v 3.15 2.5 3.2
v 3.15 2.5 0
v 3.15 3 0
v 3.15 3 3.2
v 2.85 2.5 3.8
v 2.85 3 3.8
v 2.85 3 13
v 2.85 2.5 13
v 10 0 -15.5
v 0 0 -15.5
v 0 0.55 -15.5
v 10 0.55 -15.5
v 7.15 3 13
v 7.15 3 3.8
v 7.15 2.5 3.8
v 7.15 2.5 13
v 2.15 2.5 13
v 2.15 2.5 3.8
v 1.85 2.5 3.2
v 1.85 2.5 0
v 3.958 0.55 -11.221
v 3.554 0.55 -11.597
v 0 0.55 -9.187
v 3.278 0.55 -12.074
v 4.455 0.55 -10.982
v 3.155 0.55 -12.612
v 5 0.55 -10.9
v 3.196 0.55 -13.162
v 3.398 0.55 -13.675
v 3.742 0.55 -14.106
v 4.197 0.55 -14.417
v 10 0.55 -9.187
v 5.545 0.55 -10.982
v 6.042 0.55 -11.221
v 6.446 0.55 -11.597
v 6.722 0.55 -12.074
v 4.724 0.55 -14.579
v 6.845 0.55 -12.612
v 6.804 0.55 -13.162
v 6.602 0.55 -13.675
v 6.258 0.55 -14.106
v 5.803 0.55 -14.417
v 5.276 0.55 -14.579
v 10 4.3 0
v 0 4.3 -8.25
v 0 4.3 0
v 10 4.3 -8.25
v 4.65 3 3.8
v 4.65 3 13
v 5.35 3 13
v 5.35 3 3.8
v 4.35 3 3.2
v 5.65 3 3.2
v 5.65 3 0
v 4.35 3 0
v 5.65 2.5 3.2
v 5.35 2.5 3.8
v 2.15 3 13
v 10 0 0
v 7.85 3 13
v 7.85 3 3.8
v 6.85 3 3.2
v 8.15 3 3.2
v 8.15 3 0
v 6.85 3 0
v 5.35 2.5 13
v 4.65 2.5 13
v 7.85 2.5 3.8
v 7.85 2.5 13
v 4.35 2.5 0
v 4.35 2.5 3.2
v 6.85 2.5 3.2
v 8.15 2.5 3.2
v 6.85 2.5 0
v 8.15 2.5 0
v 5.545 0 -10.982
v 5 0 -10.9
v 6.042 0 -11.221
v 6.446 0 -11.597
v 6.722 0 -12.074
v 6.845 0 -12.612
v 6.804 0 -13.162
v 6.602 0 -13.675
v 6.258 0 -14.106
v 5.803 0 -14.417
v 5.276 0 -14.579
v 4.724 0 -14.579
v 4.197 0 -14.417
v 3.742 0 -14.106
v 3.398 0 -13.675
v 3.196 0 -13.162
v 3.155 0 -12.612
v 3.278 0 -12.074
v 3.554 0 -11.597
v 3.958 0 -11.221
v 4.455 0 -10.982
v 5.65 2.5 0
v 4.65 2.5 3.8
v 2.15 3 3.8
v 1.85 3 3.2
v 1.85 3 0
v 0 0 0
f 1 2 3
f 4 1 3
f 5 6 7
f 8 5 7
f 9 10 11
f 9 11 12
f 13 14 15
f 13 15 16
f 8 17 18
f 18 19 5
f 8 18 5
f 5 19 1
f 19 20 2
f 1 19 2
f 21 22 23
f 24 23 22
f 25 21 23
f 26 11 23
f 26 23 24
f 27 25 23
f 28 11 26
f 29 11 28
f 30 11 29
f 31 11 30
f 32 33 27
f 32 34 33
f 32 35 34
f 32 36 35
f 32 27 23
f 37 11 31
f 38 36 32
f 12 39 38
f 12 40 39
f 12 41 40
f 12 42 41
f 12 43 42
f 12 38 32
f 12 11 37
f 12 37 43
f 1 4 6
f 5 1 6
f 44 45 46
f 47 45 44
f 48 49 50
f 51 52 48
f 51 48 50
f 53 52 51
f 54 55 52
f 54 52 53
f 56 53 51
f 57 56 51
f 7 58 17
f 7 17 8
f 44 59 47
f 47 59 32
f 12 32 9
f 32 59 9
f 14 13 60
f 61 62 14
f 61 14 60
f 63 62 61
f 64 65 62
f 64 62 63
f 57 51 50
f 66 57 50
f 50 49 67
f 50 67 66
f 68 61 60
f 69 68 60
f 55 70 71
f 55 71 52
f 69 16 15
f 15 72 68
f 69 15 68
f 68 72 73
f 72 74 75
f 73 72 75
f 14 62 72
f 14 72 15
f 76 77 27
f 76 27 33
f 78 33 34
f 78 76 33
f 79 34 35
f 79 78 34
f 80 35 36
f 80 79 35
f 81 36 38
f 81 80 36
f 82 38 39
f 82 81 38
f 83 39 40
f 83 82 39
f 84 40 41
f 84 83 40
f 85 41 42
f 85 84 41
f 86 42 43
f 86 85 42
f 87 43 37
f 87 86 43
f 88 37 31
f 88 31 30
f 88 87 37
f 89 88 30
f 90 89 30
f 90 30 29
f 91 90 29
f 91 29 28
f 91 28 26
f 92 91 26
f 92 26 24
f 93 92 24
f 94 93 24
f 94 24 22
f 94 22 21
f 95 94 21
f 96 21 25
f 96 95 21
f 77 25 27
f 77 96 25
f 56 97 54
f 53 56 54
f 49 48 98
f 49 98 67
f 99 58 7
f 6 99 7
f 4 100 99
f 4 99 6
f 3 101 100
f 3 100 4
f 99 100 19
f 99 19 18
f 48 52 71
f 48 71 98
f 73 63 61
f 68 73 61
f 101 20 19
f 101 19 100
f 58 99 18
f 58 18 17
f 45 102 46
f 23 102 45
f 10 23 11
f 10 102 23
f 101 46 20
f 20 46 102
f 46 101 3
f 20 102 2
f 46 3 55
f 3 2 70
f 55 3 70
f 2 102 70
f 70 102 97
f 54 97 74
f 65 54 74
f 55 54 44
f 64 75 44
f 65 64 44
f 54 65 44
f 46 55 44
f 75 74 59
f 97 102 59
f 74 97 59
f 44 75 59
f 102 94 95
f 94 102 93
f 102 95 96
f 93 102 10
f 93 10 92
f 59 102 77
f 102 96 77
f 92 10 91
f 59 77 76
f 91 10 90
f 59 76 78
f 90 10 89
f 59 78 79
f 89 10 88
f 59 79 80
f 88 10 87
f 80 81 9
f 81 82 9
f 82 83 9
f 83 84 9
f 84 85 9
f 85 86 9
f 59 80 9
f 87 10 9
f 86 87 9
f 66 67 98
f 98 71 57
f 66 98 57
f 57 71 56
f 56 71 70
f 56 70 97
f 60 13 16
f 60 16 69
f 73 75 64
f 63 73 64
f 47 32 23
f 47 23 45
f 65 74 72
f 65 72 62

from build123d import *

# Parameters (mm, degrees)
SKETCH1_W           = 10
SKETCH1_H           = 15.5
SKETCH1_R           = 1.85
BOSS_EXTRUDE1_DEPTH = 0.55
SKETCH2_W           = 10
SKETCH2_H           = 9.25
BOSS_EXTRUDE2_DEPTH = 3.75
CHAMFER1_SIZE       = 4
CHAMFER1_SIZE_2     = 1
SKETCH3_W           = 1.3
SKETCH3_H           = 0.5
BOSS_EXTRUDE3_DEPTH = 13
CUT_EXTRUDE1_DEPTH  = 19.688231591


with BuildPart() as part:
    # Sketch1 → Boss-Extrude1 (new body)
    with BuildSketch(Plane(origin=(0, 0, 0), x_dir=(1, 0, 0), z_dir=(0, 1, 0))):
        with Locations((5, 7.75)):
            Rectangle(SKETCH1_W, SKETCH1_H)
        with Locations(Location((5, 12.75, 0), (0, 0, 270))):
            Circle(SKETCH1_R, mode=Mode.SUBTRACT)
    extrude(amount=BOSS_EXTRUDE1_DEPTH)

    # Sketch2 → Boss-Extrude2 (add)
    with BuildSketch(Plane(origin=(0, 0.55, 0), x_dir=(1, 0, 0), z_dir=(0, 1, 0))):
        with Locations((5, 4.625)):
            Rectangle(SKETCH2_W, SKETCH2_H)
    extrude(amount=BOSS_EXTRUDE2_DEPTH)

    # Chamfer1
    # the kernel refuses this chamfer: 4, 1 mm, written as the material it takes off along each edge
    with BuildSketch(Plane(origin=(20.388509999, 4.3, -9.25), x_dir=(0, -0.9999563942249224, -0.00933861064031752), z_dir=(-1, 0, 0))) as chamfer1_piece_1_section:
        Polygon((CHAMFER1_SIZE * 0.999956394225, CHAMFER1_SIZE * 0.00933861064032), (-CHAMFER1_SIZE_2 * 0.00933861064032, CHAMFER1_SIZE_2 * 0.999956394225), (0, 0), align=None)
    chamfer1_piece_1 = extrude(amount=30.777019998, mode=Mode.PRIVATE)
    chamfer1_piece_1 = split(chamfer1_piece_1, bisect_by=Plane(origin=(5, 0.55, -8.951597726), z_dir=(0, 1, 0)), keep=Keep.TOP, mode=Mode.PRIVATE)
    add(chamfer1_piece_1, mode=Mode.SUBTRACT)

    # Sketch3 → Boss-Extrude3 (add)
    with BuildSketch(Plane.XY):
        with Locations((2.5, 2.75)):
            Rectangle(SKETCH3_W, SKETCH3_H)
        with Locations((5, 2.75)):
            Rectangle(SKETCH3_W, SKETCH3_H)
        with Locations((7.5, 2.75)):
            Rectangle(SKETCH3_W, SKETCH3_H)
    extrude(amount=BOSS_EXTRUDE3_DEPTH)

    # Sketch4 → Cut-Extrude1 (cut, through all)
    with BuildSketch(Plane(origin=(0, 3, 0), x_dir=(1, 0, 0), z_dir=(0, 1, 0))):
        Polygon((1.85, -3.2), (2.15, -3.8), (2.15, -13), (1.85, -13), align=None)
        Polygon((4.35, -3.2), (4.65, -3.8), (4.65, -13), (4.35, -13), align=None)
        Polygon((6.85, -3.2), (7.15, -3.8), (7.15, -13), (6.85, -13), align=None)
        Polygon((3.15, -3.2), (2.85, -3.8), (2.85, -13), (3.15, -13), align=None)
        Polygon((5.65, -3.2), (5.35, -3.8), (5.35, -13), (5.65, -13), align=None)
        Polygon((8.15, -3.2), (7.85, -3.8), (7.85, -13), (8.15, -13), align=None)
    extrude(amount=-CUT_EXTRUDE1_DEPTH, mode=Mode.SUBTRACT)


solid = part.part
